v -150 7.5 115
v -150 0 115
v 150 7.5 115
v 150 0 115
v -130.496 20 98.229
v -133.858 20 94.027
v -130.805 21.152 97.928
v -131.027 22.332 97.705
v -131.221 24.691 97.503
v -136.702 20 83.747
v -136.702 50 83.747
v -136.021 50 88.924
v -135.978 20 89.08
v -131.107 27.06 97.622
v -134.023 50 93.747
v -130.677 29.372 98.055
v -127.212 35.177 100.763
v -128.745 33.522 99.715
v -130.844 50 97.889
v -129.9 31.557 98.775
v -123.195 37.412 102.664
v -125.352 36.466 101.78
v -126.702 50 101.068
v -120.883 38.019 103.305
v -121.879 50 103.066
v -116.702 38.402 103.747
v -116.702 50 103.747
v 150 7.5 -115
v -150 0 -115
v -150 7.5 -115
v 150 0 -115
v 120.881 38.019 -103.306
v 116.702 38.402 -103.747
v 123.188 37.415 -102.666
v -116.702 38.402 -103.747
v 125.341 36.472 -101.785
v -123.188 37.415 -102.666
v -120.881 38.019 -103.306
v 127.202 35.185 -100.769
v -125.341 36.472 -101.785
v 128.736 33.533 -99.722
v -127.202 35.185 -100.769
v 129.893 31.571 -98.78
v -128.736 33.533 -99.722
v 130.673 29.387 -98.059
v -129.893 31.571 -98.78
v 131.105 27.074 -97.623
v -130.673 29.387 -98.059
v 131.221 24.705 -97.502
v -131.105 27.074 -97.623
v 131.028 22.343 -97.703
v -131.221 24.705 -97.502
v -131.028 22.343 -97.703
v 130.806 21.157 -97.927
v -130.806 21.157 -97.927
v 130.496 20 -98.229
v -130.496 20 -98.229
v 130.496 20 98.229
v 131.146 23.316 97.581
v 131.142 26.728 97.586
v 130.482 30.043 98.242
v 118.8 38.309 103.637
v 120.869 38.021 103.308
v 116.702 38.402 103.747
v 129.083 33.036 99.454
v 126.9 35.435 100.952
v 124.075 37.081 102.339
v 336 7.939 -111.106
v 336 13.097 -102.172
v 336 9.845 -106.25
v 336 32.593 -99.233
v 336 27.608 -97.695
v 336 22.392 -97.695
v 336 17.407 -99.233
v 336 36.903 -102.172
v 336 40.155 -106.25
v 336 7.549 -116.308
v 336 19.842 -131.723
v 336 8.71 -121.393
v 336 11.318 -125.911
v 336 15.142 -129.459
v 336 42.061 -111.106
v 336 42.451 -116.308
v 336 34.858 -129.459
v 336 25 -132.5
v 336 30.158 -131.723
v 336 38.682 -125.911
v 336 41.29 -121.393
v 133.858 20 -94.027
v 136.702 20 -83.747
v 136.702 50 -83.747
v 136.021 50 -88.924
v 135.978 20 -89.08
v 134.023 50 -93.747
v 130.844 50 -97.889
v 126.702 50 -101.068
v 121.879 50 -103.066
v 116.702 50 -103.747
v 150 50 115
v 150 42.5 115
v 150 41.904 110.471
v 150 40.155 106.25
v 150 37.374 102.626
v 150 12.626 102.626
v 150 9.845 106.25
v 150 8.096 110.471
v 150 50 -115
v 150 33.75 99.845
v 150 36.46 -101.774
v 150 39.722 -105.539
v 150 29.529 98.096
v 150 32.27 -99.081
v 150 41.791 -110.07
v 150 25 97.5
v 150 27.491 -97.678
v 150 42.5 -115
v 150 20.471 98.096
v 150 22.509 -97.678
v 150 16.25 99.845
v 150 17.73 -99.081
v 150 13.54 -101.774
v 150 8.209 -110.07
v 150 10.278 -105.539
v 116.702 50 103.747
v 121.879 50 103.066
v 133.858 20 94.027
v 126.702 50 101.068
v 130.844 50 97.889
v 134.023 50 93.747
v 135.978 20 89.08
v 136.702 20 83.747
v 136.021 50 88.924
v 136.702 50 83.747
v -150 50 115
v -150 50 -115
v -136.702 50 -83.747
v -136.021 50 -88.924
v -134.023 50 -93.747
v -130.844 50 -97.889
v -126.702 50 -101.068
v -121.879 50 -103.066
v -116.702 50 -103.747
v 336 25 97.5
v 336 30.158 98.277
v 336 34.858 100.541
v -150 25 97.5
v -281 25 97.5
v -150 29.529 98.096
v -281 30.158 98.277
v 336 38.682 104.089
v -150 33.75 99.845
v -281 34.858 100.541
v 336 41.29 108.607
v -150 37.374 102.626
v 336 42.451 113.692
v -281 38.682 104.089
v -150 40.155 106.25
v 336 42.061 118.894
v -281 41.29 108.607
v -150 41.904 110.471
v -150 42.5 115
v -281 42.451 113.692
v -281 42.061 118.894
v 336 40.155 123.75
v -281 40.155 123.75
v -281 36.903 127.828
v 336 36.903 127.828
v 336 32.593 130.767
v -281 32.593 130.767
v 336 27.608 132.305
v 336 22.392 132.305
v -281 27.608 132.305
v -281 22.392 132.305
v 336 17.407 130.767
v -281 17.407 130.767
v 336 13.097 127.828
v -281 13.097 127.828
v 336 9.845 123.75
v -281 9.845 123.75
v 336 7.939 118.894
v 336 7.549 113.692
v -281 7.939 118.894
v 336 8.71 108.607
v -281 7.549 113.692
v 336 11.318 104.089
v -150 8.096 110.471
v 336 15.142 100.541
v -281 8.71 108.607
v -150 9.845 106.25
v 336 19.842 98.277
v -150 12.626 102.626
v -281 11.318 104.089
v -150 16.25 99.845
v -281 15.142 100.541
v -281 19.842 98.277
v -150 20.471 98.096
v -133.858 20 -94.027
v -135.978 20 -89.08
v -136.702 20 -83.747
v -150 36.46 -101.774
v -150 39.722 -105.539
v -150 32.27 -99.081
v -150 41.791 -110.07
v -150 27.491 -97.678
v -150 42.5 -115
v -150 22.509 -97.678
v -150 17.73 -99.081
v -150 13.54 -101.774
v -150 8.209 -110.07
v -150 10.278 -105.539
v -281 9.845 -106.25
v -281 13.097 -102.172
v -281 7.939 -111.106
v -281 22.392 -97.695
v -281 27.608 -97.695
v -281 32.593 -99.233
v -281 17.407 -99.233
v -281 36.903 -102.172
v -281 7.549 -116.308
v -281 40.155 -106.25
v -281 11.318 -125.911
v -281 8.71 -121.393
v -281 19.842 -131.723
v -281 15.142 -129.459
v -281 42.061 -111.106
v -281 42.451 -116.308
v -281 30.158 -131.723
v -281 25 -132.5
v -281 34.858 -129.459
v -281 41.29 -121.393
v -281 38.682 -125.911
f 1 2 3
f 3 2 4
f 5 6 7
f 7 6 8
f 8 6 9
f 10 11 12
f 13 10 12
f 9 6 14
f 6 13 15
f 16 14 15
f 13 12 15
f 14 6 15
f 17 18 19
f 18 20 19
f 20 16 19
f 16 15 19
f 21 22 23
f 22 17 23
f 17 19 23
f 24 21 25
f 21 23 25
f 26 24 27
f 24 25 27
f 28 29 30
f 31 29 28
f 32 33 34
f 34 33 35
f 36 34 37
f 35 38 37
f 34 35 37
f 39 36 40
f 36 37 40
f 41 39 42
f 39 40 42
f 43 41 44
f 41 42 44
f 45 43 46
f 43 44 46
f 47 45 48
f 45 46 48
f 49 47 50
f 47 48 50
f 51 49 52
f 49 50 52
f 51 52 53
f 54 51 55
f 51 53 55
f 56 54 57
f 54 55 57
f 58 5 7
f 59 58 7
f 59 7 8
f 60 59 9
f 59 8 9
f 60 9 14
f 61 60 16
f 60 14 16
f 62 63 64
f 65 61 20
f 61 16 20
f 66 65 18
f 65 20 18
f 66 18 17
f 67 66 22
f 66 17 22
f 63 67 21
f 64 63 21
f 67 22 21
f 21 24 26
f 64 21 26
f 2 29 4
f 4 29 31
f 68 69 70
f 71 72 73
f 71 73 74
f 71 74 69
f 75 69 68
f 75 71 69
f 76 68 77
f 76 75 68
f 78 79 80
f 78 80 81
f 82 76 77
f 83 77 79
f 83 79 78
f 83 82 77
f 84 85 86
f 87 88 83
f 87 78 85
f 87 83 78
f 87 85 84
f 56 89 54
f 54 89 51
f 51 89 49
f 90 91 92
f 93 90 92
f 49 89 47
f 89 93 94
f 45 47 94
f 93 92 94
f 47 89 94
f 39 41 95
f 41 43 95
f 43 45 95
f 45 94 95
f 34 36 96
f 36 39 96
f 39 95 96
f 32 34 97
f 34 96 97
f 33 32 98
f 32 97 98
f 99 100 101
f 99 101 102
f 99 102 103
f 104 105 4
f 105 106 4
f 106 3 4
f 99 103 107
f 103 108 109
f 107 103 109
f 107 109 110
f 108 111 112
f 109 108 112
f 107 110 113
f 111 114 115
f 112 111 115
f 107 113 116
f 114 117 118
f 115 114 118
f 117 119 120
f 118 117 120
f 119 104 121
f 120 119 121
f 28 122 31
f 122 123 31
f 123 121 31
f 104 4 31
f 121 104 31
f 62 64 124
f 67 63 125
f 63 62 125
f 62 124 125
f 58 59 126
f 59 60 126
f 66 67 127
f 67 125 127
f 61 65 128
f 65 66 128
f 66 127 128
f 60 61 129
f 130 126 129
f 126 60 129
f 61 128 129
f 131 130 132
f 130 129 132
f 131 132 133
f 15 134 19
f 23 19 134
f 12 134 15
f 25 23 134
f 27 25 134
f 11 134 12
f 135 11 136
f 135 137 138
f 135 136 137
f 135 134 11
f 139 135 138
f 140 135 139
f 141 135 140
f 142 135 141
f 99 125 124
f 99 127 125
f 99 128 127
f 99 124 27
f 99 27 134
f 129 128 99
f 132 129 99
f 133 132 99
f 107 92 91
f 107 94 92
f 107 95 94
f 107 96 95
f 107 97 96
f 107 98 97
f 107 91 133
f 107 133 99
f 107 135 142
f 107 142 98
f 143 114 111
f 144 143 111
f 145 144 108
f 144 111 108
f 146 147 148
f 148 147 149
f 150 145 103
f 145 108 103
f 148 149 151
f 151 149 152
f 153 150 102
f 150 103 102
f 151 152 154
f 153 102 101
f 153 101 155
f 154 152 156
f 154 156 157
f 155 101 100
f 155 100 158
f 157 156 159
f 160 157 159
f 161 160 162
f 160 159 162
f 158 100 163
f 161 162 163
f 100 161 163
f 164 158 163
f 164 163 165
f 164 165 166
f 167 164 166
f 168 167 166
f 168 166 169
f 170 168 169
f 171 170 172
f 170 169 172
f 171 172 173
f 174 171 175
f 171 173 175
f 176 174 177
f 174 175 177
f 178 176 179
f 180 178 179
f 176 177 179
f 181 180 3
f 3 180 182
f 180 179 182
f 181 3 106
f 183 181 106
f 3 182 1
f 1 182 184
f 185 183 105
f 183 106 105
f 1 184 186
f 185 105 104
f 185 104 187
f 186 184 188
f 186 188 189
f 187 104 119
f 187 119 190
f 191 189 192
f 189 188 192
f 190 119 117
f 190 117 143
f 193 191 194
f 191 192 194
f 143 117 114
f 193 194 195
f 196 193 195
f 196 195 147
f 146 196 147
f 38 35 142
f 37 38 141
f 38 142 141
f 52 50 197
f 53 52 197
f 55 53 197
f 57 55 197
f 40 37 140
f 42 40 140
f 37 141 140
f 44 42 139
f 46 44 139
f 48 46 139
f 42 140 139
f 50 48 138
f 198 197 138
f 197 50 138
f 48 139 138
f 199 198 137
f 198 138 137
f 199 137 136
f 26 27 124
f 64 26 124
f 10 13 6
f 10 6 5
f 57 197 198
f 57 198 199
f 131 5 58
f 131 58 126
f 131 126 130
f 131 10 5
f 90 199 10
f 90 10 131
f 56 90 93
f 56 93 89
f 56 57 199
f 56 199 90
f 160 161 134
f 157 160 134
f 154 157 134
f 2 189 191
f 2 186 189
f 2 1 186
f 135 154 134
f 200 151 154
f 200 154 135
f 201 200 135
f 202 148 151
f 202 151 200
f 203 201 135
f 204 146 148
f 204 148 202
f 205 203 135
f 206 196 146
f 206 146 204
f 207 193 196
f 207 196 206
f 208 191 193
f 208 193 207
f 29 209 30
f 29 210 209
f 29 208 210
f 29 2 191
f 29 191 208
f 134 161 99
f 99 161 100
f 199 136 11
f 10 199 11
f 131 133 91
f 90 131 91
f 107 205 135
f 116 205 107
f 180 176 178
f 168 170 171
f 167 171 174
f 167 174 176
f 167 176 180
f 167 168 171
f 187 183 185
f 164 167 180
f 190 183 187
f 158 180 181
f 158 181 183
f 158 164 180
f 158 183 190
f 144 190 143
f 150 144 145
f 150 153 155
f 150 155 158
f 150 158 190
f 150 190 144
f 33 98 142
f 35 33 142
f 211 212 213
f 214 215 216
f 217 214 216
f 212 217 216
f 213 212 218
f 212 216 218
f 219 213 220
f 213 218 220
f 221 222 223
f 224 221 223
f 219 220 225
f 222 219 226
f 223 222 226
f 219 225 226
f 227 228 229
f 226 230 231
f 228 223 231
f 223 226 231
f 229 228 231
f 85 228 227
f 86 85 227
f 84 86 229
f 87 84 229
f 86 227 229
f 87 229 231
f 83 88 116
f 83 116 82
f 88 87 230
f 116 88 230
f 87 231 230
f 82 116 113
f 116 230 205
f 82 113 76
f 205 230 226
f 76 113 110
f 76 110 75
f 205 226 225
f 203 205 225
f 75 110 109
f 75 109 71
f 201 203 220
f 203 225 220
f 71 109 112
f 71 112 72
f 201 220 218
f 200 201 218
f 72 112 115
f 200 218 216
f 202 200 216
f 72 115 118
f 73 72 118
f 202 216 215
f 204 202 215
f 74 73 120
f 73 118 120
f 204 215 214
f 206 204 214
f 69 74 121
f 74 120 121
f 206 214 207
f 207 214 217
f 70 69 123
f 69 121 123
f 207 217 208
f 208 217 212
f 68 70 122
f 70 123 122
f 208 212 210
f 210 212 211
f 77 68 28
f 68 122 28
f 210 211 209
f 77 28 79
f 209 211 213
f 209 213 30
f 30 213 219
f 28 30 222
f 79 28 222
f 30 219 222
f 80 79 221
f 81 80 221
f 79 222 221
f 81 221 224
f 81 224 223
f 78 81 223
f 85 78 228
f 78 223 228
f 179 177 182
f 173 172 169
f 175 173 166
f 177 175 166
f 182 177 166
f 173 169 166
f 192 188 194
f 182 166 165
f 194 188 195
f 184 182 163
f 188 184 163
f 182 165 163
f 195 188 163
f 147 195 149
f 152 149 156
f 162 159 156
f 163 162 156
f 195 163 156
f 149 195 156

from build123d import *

# Parameters (mm, degrees)
SKETCH1_W                = 300
SKETCH1_H                = 230
BOSS_EXTRUDE1_DEPTH      = 50
CUT_EXTRUDE1_DEPTH       = 30
BOSS_EXTRUDE2_DEPTH      = 186
BOSS_EXTRUDE2_DEPTH_BACK = 431
SKETCH3_R                = 17.5


with BuildPart() as part:
    # Sketch1 → Boss-Extrude1 (new body)
    with BuildSketch(Plane(origin=(0, 0, 0), x_dir=(1, 0, 0), z_dir=(0, 1, 0))):
        Rectangle(SKETCH1_W, SKETCH1_H)
    extrude(amount=BOSS_EXTRUDE1_DEPTH)

    # Sketch2 → Cut-Extrude1 (cut)
    with BuildSketch(Plane(origin=(0, 50, 0), x_dir=(1, 0, 0), z_dir=(0, 1, 0))):
        with BuildLine():
            Line((116.702187757, 103.747196066), (-116.702187757, 103.747196066))
            ThreePointArc((-116.702187757, 103.747196066), (-130.844323381, 97.889331689), (-136.702187757, 83.747196066))
            Line((-136.702187757, 83.747196066), (-136.702187757, -83.747196066))
            ThreePointArc((-136.702187757, -83.747196066), (-130.844323381, -97.889331689), (-116.702187757, -103.747196066))
            Line((-116.702187757, -103.747196066), (116.702187757, -103.747196066))
            ThreePointArc((116.702187757, -103.747196066), (130.844323381, -97.889331689), (136.702187757, -83.747196066))
            Line((136.702187757, -83.747196066), (136.702187757, 83.747196066))
            ThreePointArc((136.702187757, 83.747196066), (130.844323381, 97.889331689), (116.702187757, 103.747196066))
        make_face()
    extrude(amount=-CUT_EXTRUDE1_DEPTH, mode=Mode.SUBTRACT)

    # Sketch3 → Boss-Extrude2 (add, two sides: drawn at the far end of the back side and taken through both)
    with BuildSketch(Plane(origin=(150, 0, 0), x_dir=(0, 0, -1), z_dir=(1, 0, 0)).offset(-BOSS_EXTRUDE2_DEPTH_BACK)):
        with Locations((115, 25)):
            Circle(SKETCH3_R)
        with Locations((-115, 25)):
            Circle(SKETCH3_R)
    extrude(amount=BOSS_EXTRUDE2_DEPTH + BOSS_EXTRUDE2_DEPTH_BACK)


solid = part.part
